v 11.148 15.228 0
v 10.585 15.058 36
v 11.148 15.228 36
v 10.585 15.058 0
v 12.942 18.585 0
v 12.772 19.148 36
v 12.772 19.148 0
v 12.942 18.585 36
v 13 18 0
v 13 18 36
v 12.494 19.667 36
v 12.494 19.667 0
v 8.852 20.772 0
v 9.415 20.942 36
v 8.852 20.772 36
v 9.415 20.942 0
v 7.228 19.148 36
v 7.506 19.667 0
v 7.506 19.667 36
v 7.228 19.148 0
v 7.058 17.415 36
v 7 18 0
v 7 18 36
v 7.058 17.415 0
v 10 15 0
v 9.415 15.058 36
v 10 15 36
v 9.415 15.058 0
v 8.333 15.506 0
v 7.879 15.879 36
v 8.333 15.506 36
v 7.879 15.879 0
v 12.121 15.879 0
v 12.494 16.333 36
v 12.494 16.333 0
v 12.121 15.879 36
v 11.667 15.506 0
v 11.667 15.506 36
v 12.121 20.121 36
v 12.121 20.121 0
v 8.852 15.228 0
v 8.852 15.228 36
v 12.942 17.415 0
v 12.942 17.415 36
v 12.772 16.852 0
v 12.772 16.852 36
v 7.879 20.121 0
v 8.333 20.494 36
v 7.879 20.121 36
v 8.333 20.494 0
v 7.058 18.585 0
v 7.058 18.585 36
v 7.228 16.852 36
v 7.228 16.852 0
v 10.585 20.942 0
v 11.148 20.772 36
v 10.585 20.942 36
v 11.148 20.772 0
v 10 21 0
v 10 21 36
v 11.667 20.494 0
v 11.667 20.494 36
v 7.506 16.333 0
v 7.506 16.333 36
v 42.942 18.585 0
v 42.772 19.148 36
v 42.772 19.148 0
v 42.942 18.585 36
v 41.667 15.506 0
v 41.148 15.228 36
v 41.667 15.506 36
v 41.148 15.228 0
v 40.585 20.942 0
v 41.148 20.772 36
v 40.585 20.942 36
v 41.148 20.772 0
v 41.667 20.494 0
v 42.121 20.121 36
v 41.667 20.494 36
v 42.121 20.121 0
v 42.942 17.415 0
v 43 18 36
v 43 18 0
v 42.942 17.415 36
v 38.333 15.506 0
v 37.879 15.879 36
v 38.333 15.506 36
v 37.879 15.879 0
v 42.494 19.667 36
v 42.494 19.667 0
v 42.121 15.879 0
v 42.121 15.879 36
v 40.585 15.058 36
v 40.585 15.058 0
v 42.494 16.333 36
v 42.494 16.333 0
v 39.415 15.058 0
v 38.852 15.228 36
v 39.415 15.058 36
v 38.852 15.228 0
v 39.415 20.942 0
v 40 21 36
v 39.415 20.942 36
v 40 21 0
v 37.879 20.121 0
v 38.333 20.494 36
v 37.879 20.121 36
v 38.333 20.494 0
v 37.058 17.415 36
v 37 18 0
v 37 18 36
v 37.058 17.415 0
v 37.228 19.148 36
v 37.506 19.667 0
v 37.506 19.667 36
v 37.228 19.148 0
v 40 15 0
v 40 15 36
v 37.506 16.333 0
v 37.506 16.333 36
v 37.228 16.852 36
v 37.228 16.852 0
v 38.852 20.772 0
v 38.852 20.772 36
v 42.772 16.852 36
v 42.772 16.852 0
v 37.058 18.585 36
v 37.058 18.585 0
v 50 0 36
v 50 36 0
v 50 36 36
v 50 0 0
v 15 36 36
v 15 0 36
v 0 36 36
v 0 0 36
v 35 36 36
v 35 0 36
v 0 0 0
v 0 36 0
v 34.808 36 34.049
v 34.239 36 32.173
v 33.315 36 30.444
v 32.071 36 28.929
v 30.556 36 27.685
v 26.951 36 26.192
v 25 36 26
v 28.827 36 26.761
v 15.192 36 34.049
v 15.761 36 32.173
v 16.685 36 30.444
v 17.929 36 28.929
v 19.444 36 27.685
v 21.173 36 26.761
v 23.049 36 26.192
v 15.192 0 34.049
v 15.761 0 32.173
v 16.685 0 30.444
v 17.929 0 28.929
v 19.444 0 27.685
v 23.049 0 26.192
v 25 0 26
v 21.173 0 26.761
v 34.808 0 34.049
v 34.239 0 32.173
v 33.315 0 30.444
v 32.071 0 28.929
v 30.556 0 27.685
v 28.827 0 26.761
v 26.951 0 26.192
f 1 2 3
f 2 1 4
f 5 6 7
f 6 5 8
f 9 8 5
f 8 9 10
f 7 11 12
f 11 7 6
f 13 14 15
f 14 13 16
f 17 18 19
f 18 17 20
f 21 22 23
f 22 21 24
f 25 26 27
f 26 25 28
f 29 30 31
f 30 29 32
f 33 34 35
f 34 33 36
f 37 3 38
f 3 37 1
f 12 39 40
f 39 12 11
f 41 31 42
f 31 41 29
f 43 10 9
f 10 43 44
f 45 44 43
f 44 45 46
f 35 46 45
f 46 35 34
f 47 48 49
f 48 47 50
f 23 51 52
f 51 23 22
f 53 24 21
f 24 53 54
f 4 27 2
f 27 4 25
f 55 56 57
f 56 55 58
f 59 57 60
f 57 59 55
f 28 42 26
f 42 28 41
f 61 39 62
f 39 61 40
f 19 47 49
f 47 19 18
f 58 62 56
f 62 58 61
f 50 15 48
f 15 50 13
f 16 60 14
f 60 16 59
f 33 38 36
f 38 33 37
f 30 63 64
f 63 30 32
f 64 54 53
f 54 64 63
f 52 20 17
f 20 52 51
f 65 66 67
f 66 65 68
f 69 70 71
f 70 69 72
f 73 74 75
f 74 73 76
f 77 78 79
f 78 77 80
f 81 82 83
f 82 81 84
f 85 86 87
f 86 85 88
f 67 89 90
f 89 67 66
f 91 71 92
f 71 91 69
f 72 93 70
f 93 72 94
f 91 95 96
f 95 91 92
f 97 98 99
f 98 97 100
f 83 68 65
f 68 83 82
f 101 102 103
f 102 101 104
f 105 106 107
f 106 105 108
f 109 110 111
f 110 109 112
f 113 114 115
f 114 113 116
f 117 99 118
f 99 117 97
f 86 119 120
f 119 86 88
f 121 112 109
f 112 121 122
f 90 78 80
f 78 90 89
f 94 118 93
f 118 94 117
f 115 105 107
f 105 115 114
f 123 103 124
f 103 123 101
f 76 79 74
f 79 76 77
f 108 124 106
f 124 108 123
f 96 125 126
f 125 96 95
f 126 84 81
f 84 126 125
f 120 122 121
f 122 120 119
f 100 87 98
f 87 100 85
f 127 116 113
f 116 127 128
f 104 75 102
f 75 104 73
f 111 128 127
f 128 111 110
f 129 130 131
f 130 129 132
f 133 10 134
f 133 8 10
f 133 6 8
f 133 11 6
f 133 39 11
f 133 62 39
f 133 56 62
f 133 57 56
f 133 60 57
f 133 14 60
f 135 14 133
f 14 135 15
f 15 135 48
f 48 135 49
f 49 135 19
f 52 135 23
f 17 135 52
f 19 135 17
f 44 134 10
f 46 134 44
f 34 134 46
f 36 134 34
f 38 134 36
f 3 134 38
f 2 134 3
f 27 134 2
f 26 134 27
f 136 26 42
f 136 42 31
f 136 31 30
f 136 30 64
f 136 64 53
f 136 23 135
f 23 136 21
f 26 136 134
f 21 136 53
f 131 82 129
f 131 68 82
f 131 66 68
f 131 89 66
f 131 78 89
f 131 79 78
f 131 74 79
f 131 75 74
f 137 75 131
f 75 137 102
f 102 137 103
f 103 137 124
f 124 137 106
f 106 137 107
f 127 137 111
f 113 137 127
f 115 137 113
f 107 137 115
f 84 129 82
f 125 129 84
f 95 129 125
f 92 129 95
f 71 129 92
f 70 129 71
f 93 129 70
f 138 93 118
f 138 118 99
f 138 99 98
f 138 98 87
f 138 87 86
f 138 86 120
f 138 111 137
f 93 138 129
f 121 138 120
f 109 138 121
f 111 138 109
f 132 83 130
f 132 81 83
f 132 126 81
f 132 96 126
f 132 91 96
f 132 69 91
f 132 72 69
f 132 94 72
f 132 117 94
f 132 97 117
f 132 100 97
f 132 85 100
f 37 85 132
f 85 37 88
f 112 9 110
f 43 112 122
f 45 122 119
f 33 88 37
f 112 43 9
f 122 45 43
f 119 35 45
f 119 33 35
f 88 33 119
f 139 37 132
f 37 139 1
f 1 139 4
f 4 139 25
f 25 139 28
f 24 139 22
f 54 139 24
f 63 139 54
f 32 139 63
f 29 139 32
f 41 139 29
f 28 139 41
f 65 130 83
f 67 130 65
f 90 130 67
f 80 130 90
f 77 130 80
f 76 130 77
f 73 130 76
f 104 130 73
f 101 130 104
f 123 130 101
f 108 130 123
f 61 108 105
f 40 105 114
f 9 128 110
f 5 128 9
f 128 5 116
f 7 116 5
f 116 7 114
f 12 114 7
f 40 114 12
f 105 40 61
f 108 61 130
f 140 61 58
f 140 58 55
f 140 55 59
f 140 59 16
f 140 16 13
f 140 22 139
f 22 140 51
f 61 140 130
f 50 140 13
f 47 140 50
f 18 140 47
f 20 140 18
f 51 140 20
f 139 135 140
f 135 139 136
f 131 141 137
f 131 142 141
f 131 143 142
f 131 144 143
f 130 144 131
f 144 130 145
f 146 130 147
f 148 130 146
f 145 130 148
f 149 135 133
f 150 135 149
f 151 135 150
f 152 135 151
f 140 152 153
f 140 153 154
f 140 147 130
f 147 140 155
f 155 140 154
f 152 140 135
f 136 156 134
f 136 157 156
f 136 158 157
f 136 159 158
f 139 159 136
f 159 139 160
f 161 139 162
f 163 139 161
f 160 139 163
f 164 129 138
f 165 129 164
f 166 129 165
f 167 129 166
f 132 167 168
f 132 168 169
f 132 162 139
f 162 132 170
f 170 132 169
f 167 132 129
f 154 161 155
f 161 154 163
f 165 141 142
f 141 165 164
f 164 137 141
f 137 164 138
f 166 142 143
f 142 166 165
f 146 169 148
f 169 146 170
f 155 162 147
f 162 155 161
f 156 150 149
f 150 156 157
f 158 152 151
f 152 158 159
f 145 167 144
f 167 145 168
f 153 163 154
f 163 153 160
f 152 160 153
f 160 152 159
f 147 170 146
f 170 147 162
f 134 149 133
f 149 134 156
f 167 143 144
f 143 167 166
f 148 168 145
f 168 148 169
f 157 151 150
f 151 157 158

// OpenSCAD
$fn = 32;

// ----------------------------------------------------------------------
// Saddle clamp: plain shaft clamp
// ----------------------------------------------------------------------

// --- parameters (mm) ---
blk_l = 50;               // block length, X
blk_w = 36;               // block width, Y
blk_h = 36;               // block height
clamp_r = 10;             // shaft groove radius
hole_r = 3;               // bolt hole radius
hole_m = 10;              // bolt hole margin from the ends
fit_tol = 0.1;            // tolerance for press fits, mm
free_tol = 0.5;           // tolerance for clearance fits, mm

saw_depth = clamp_r + 3;  // saw kerf depth

difference() {
  cube([blk_l, blk_w, blk_h]);
  translate([blk_l / 2, -1, blk_h])
    rotate([-90, 0, 0])
      cylinder(h = blk_w + 2, r = clamp_r);
  for (sx = [0, 1])
    translate([sx ? blk_l - hole_m : hole_m, blk_w / 2, -1])
      cylinder(r = hole_r, h = blk_h + 2);
}
